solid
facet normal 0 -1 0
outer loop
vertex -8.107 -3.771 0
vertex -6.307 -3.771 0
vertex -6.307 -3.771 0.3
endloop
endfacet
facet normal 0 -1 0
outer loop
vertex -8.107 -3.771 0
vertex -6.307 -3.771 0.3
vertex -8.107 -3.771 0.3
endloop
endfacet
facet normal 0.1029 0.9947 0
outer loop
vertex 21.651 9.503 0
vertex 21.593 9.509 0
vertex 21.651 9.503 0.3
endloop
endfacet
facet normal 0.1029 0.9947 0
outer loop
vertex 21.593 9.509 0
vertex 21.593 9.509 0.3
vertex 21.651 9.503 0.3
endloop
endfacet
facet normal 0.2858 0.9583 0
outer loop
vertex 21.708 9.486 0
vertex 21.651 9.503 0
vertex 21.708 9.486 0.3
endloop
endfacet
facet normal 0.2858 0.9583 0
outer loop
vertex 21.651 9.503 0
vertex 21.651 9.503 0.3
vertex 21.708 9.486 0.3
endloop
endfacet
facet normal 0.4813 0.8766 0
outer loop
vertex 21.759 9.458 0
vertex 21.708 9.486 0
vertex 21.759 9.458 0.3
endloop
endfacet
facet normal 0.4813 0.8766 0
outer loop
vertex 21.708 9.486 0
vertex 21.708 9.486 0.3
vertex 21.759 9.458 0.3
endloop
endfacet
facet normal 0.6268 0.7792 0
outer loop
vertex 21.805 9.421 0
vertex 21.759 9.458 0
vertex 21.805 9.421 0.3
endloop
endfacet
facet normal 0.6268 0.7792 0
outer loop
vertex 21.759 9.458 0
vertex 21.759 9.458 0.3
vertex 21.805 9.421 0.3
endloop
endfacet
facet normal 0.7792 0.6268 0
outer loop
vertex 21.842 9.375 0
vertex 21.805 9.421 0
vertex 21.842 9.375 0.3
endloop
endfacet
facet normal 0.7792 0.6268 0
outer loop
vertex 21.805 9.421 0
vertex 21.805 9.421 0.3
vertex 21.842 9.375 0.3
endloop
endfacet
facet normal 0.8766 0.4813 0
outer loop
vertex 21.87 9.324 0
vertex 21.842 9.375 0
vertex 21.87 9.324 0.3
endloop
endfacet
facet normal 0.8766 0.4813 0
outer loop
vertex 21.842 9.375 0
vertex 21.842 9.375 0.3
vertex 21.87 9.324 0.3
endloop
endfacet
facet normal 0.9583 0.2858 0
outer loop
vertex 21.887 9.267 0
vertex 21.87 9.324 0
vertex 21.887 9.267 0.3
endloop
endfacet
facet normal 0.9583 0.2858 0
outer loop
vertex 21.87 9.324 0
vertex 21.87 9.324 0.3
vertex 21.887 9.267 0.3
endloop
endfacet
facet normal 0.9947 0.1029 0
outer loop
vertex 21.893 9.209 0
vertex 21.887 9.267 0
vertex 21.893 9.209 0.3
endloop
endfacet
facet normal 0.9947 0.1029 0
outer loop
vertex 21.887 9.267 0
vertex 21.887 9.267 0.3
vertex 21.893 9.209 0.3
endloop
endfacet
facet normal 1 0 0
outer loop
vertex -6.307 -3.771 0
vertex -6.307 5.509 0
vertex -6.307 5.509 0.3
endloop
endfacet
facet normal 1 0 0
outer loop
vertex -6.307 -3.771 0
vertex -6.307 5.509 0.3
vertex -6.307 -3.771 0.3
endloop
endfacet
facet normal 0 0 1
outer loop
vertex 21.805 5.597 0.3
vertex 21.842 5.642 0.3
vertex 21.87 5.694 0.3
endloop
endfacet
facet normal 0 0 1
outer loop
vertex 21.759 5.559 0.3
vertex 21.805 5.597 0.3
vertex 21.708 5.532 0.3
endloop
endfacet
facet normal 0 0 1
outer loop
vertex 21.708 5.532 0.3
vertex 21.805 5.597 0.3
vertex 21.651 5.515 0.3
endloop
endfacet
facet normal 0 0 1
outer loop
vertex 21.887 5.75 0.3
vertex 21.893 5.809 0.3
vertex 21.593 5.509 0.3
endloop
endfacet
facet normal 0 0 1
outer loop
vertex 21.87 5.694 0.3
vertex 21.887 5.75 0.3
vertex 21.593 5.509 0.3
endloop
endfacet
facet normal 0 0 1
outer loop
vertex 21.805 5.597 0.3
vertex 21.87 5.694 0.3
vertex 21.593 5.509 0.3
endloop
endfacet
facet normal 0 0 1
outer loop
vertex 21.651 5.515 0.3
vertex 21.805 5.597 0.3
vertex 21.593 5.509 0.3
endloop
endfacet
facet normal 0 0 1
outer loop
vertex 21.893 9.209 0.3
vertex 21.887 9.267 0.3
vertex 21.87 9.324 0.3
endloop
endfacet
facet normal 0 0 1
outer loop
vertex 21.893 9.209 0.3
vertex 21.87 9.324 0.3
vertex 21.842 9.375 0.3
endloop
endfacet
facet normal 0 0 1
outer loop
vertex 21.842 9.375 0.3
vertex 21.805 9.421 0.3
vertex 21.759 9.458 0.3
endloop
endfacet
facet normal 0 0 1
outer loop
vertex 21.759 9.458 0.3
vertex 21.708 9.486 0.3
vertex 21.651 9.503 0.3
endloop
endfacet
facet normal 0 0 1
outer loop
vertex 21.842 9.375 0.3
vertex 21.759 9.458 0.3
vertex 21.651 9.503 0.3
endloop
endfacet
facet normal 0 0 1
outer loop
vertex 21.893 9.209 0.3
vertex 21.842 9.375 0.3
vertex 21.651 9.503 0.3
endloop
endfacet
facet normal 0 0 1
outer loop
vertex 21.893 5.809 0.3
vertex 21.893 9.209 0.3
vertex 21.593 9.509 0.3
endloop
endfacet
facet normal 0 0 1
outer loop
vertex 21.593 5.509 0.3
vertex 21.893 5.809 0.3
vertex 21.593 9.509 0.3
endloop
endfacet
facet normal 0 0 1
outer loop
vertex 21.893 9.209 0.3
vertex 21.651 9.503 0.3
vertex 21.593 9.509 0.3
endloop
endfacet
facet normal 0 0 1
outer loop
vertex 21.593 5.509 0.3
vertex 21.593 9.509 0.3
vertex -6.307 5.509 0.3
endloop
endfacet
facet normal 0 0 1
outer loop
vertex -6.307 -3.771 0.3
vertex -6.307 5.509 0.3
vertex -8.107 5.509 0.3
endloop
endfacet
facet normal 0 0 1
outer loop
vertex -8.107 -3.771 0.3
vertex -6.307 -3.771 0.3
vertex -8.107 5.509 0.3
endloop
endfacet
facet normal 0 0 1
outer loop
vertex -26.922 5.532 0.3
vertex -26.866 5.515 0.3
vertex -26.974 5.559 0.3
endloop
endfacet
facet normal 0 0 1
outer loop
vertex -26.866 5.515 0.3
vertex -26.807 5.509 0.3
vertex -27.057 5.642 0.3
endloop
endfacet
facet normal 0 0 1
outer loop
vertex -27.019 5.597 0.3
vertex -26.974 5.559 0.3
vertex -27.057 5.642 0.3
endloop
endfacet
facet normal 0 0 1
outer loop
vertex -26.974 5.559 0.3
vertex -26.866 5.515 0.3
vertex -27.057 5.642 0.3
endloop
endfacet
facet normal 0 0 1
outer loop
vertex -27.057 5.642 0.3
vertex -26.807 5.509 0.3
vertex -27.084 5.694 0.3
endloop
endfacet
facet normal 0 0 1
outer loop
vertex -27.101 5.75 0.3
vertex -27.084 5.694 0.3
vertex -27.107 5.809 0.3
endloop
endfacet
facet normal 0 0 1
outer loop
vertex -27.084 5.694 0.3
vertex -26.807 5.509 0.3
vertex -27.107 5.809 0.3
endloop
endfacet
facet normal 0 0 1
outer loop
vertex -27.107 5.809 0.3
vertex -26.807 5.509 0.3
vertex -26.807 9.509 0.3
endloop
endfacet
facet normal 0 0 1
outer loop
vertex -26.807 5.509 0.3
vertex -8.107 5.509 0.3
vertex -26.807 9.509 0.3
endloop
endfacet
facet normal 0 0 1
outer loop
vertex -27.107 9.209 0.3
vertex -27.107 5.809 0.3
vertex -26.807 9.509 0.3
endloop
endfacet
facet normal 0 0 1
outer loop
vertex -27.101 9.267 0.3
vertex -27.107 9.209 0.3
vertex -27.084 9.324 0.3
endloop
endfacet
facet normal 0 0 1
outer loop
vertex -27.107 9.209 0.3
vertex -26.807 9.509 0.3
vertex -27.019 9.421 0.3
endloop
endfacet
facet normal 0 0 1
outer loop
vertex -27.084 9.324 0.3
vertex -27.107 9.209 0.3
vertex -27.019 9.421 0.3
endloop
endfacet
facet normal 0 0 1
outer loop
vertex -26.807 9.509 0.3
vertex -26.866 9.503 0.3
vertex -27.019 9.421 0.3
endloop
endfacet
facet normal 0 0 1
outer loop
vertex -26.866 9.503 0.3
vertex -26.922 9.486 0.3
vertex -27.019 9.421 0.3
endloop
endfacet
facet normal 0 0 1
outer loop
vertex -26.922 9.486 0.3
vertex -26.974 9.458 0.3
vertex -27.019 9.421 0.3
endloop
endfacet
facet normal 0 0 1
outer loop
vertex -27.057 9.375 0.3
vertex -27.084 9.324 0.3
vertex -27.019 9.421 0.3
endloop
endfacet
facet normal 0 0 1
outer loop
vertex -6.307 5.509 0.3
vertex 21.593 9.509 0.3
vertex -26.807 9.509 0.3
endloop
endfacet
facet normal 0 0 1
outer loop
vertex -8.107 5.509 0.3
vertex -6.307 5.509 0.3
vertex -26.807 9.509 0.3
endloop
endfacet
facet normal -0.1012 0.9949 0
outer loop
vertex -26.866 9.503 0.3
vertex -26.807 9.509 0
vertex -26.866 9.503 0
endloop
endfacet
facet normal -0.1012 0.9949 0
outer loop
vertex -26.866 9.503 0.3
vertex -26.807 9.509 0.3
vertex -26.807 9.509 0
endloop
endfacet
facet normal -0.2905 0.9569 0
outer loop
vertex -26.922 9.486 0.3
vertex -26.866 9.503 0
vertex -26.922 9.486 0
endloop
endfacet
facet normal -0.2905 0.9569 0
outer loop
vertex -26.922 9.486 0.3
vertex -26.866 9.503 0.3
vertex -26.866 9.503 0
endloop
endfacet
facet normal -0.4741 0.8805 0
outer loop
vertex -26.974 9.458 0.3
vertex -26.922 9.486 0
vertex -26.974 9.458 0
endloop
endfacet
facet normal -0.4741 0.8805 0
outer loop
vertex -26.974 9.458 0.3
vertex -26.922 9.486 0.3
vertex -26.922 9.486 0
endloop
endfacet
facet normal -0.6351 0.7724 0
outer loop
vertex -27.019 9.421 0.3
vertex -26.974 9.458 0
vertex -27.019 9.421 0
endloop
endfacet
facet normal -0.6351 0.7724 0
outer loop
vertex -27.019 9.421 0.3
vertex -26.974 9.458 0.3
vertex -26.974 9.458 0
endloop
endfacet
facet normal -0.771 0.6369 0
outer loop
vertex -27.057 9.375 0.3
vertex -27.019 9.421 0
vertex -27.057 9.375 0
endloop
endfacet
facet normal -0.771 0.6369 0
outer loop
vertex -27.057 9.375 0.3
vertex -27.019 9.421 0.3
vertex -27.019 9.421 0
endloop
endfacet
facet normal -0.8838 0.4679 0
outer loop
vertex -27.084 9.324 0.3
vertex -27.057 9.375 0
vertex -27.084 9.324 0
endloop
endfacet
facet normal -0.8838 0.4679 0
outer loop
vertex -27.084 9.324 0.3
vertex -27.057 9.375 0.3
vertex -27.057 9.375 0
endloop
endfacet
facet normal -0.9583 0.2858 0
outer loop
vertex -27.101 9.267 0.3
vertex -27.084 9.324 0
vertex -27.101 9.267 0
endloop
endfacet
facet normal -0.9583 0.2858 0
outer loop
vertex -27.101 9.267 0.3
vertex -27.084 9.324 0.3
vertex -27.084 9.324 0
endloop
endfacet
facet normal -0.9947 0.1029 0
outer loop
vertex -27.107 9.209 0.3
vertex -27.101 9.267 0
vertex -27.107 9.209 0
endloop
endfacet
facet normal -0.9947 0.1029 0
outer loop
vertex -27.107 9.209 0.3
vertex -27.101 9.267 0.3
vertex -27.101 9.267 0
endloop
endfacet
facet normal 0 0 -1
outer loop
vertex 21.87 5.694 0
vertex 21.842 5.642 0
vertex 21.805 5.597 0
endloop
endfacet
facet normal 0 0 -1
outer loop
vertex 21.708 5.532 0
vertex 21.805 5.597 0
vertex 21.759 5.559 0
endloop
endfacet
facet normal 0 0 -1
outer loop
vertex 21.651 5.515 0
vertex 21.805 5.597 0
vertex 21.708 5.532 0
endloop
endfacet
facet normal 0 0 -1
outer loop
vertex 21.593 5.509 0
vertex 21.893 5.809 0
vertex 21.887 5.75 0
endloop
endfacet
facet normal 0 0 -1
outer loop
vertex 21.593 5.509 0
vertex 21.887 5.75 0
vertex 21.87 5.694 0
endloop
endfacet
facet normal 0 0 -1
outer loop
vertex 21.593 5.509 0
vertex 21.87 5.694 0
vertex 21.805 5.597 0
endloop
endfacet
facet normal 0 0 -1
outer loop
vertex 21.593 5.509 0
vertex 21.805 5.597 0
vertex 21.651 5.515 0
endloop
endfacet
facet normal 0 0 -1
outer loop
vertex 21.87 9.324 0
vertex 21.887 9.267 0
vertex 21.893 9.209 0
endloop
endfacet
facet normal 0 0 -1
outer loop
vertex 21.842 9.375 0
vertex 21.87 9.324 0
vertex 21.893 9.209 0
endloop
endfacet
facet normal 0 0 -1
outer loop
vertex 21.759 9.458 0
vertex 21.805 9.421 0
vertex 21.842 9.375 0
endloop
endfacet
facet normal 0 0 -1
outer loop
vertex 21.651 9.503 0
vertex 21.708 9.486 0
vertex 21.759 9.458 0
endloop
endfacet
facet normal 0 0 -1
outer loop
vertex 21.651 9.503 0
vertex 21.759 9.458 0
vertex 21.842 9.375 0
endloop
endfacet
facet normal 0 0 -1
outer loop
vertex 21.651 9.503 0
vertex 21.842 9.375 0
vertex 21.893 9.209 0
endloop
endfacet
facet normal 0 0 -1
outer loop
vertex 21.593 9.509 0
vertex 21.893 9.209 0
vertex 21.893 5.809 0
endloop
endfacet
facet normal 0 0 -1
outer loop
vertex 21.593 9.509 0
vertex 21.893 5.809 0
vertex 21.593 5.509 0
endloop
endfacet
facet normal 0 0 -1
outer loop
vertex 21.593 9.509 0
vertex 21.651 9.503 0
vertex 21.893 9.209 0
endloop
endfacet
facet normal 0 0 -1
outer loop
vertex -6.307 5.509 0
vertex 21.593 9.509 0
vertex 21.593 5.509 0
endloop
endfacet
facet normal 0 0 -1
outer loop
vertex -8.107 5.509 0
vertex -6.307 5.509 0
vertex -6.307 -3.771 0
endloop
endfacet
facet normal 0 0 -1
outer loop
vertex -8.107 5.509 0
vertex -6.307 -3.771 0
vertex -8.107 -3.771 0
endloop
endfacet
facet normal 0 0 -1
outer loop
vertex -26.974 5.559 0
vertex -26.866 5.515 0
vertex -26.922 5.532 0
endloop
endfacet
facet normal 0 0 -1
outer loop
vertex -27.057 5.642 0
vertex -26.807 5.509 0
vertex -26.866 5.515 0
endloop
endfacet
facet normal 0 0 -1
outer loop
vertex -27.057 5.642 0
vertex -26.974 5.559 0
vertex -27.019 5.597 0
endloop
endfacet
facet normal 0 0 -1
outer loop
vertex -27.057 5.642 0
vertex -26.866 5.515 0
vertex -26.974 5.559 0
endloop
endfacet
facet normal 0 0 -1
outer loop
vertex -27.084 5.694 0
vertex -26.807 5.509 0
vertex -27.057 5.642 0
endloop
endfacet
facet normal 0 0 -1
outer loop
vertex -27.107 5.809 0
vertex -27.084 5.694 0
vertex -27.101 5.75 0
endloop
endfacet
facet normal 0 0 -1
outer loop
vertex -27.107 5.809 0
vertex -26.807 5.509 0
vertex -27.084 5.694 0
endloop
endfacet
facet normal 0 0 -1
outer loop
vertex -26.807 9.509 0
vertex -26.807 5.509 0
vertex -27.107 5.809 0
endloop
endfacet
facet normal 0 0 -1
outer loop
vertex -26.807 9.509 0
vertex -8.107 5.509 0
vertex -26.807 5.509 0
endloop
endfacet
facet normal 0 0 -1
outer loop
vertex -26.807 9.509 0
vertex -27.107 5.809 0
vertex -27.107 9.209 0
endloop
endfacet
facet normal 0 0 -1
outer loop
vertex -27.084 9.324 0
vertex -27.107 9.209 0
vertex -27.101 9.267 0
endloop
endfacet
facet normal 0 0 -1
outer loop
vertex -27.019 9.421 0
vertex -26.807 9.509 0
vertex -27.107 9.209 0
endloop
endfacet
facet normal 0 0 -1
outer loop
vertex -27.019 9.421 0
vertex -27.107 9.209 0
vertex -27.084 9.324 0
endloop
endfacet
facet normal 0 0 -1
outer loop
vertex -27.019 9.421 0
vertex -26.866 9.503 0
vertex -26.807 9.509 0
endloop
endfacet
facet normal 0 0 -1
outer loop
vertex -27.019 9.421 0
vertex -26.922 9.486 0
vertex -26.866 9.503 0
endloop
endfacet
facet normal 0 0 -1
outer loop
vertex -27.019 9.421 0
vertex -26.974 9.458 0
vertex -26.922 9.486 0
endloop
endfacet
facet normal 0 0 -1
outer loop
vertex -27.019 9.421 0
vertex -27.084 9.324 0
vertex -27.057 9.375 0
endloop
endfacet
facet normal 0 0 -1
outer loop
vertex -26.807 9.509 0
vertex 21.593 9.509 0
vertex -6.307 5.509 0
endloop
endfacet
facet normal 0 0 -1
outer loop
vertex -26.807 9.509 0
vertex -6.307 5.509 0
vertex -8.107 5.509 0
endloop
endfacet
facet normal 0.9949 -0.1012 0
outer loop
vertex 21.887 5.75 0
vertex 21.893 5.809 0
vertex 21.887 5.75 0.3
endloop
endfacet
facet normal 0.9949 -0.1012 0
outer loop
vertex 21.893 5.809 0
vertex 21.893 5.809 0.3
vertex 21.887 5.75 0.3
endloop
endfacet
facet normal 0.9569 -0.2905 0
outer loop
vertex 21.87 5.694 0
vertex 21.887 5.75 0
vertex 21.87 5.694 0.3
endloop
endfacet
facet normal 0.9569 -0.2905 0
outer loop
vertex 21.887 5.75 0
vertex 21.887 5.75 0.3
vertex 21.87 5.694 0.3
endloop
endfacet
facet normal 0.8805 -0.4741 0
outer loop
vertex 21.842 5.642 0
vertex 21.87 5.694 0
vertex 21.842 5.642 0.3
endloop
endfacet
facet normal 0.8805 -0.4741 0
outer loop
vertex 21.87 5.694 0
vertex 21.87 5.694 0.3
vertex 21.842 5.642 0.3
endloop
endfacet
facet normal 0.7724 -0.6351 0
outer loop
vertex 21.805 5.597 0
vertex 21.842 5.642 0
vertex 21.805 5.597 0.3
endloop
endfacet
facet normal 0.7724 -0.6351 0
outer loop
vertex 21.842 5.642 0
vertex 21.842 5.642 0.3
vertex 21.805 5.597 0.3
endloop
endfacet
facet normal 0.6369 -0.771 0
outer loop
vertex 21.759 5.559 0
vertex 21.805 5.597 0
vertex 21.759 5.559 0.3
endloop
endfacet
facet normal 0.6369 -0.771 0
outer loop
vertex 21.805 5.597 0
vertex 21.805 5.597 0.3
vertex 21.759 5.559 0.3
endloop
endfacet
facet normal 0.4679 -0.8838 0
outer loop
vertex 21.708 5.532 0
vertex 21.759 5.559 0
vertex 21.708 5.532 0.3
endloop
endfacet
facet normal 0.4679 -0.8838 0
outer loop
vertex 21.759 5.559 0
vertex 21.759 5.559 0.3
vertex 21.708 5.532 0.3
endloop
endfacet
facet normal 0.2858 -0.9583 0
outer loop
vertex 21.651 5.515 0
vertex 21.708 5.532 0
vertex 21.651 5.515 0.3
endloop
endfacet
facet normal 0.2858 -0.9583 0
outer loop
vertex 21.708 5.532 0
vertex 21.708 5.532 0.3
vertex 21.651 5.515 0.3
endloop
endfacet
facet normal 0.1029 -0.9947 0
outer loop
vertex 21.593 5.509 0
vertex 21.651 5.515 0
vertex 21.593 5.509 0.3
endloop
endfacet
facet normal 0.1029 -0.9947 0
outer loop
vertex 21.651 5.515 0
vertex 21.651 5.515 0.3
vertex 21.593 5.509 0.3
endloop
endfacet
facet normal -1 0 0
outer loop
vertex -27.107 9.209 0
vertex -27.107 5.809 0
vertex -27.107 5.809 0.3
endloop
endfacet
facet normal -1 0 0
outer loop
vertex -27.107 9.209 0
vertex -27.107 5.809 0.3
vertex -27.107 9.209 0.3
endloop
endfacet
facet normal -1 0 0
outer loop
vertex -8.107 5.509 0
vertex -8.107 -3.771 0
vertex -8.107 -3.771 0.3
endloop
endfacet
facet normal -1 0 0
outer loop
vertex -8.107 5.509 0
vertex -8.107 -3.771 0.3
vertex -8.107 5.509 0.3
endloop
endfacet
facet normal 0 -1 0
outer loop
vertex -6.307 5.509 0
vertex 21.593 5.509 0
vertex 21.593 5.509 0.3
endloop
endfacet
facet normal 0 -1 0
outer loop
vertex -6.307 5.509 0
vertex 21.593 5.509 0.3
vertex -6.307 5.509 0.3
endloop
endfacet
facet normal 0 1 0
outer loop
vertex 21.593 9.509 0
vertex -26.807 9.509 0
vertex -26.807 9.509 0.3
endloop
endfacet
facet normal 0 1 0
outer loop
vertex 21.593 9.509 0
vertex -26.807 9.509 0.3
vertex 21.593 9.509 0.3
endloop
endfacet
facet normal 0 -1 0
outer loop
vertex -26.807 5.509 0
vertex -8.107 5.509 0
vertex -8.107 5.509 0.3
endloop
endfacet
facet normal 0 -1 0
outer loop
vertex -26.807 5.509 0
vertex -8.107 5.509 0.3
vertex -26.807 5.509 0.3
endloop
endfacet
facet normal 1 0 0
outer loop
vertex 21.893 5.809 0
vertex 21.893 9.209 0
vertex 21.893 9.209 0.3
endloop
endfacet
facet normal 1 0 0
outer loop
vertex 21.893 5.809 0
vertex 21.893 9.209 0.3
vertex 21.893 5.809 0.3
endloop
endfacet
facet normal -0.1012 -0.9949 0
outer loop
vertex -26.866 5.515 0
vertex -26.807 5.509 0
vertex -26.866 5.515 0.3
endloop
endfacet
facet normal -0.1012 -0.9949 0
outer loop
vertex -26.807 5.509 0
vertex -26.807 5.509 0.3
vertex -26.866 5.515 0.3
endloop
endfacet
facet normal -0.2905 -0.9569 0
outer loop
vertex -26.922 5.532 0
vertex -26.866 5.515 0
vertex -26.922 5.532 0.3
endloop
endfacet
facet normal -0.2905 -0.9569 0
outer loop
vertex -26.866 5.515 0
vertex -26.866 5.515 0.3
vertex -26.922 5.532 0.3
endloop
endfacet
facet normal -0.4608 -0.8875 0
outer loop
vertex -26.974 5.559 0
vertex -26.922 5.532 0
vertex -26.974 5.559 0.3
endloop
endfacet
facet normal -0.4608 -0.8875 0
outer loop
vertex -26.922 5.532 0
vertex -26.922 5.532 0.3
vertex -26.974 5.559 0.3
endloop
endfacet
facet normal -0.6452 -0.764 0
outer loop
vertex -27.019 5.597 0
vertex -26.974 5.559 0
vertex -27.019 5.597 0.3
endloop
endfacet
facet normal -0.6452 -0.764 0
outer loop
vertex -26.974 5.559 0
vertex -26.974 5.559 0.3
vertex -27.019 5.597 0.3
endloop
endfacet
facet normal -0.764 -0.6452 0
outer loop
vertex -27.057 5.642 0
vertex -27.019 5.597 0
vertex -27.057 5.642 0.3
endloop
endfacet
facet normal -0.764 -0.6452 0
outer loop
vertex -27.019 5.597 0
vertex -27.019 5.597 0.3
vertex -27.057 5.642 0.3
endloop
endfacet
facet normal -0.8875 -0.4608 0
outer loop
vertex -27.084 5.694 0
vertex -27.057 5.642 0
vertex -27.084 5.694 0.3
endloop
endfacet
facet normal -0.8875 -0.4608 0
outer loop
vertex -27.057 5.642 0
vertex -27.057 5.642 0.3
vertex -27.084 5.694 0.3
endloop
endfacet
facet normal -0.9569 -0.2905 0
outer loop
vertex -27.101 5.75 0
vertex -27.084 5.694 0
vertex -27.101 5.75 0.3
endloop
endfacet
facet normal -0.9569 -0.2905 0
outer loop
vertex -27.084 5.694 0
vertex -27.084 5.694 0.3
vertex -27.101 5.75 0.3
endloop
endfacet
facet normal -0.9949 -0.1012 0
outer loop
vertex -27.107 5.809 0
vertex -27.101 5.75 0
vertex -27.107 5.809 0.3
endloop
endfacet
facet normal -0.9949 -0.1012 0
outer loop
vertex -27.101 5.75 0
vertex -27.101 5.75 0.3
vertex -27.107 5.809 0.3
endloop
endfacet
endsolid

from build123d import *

# Parameters (mm, degrees)
EXTRUDE_1_DEPTH = 0.3
FILLET_1_R      = 0.3


with BuildPart() as part:
    # Sketch 1 → Extrude 1 (new body)
    with BuildSketch(Plane.XY):
        Polygon((-27.107233061, 9.508788635), (21.892766939, 9.508788635), (21.892766939, 5.508788635), (-6.307233061, 5.508788635), (-6.307233061, -3.771211365), (-8.107233061, -3.771211365), (-8.107233061, 5.508788635), (-27.107233061, 5.508788635), align=None)
    extrude(amount=EXTRUDE_1_DEPTH)

    # Fillet 1
    fillet_1_edges = [part.edges().sort_by_distance(p)[0] for p in [
        (21.892766939, 5.508788635, 0.15),
        (21.892766939, 9.508788635, 0.15),
        (-27.107233061, 9.508788635, 0.15),
        (-27.107233061, 5.508788635, 0.15),
    ]]
    fillet(fillet_1_edges, radius=FILLET_1_R)


solid = part.part
